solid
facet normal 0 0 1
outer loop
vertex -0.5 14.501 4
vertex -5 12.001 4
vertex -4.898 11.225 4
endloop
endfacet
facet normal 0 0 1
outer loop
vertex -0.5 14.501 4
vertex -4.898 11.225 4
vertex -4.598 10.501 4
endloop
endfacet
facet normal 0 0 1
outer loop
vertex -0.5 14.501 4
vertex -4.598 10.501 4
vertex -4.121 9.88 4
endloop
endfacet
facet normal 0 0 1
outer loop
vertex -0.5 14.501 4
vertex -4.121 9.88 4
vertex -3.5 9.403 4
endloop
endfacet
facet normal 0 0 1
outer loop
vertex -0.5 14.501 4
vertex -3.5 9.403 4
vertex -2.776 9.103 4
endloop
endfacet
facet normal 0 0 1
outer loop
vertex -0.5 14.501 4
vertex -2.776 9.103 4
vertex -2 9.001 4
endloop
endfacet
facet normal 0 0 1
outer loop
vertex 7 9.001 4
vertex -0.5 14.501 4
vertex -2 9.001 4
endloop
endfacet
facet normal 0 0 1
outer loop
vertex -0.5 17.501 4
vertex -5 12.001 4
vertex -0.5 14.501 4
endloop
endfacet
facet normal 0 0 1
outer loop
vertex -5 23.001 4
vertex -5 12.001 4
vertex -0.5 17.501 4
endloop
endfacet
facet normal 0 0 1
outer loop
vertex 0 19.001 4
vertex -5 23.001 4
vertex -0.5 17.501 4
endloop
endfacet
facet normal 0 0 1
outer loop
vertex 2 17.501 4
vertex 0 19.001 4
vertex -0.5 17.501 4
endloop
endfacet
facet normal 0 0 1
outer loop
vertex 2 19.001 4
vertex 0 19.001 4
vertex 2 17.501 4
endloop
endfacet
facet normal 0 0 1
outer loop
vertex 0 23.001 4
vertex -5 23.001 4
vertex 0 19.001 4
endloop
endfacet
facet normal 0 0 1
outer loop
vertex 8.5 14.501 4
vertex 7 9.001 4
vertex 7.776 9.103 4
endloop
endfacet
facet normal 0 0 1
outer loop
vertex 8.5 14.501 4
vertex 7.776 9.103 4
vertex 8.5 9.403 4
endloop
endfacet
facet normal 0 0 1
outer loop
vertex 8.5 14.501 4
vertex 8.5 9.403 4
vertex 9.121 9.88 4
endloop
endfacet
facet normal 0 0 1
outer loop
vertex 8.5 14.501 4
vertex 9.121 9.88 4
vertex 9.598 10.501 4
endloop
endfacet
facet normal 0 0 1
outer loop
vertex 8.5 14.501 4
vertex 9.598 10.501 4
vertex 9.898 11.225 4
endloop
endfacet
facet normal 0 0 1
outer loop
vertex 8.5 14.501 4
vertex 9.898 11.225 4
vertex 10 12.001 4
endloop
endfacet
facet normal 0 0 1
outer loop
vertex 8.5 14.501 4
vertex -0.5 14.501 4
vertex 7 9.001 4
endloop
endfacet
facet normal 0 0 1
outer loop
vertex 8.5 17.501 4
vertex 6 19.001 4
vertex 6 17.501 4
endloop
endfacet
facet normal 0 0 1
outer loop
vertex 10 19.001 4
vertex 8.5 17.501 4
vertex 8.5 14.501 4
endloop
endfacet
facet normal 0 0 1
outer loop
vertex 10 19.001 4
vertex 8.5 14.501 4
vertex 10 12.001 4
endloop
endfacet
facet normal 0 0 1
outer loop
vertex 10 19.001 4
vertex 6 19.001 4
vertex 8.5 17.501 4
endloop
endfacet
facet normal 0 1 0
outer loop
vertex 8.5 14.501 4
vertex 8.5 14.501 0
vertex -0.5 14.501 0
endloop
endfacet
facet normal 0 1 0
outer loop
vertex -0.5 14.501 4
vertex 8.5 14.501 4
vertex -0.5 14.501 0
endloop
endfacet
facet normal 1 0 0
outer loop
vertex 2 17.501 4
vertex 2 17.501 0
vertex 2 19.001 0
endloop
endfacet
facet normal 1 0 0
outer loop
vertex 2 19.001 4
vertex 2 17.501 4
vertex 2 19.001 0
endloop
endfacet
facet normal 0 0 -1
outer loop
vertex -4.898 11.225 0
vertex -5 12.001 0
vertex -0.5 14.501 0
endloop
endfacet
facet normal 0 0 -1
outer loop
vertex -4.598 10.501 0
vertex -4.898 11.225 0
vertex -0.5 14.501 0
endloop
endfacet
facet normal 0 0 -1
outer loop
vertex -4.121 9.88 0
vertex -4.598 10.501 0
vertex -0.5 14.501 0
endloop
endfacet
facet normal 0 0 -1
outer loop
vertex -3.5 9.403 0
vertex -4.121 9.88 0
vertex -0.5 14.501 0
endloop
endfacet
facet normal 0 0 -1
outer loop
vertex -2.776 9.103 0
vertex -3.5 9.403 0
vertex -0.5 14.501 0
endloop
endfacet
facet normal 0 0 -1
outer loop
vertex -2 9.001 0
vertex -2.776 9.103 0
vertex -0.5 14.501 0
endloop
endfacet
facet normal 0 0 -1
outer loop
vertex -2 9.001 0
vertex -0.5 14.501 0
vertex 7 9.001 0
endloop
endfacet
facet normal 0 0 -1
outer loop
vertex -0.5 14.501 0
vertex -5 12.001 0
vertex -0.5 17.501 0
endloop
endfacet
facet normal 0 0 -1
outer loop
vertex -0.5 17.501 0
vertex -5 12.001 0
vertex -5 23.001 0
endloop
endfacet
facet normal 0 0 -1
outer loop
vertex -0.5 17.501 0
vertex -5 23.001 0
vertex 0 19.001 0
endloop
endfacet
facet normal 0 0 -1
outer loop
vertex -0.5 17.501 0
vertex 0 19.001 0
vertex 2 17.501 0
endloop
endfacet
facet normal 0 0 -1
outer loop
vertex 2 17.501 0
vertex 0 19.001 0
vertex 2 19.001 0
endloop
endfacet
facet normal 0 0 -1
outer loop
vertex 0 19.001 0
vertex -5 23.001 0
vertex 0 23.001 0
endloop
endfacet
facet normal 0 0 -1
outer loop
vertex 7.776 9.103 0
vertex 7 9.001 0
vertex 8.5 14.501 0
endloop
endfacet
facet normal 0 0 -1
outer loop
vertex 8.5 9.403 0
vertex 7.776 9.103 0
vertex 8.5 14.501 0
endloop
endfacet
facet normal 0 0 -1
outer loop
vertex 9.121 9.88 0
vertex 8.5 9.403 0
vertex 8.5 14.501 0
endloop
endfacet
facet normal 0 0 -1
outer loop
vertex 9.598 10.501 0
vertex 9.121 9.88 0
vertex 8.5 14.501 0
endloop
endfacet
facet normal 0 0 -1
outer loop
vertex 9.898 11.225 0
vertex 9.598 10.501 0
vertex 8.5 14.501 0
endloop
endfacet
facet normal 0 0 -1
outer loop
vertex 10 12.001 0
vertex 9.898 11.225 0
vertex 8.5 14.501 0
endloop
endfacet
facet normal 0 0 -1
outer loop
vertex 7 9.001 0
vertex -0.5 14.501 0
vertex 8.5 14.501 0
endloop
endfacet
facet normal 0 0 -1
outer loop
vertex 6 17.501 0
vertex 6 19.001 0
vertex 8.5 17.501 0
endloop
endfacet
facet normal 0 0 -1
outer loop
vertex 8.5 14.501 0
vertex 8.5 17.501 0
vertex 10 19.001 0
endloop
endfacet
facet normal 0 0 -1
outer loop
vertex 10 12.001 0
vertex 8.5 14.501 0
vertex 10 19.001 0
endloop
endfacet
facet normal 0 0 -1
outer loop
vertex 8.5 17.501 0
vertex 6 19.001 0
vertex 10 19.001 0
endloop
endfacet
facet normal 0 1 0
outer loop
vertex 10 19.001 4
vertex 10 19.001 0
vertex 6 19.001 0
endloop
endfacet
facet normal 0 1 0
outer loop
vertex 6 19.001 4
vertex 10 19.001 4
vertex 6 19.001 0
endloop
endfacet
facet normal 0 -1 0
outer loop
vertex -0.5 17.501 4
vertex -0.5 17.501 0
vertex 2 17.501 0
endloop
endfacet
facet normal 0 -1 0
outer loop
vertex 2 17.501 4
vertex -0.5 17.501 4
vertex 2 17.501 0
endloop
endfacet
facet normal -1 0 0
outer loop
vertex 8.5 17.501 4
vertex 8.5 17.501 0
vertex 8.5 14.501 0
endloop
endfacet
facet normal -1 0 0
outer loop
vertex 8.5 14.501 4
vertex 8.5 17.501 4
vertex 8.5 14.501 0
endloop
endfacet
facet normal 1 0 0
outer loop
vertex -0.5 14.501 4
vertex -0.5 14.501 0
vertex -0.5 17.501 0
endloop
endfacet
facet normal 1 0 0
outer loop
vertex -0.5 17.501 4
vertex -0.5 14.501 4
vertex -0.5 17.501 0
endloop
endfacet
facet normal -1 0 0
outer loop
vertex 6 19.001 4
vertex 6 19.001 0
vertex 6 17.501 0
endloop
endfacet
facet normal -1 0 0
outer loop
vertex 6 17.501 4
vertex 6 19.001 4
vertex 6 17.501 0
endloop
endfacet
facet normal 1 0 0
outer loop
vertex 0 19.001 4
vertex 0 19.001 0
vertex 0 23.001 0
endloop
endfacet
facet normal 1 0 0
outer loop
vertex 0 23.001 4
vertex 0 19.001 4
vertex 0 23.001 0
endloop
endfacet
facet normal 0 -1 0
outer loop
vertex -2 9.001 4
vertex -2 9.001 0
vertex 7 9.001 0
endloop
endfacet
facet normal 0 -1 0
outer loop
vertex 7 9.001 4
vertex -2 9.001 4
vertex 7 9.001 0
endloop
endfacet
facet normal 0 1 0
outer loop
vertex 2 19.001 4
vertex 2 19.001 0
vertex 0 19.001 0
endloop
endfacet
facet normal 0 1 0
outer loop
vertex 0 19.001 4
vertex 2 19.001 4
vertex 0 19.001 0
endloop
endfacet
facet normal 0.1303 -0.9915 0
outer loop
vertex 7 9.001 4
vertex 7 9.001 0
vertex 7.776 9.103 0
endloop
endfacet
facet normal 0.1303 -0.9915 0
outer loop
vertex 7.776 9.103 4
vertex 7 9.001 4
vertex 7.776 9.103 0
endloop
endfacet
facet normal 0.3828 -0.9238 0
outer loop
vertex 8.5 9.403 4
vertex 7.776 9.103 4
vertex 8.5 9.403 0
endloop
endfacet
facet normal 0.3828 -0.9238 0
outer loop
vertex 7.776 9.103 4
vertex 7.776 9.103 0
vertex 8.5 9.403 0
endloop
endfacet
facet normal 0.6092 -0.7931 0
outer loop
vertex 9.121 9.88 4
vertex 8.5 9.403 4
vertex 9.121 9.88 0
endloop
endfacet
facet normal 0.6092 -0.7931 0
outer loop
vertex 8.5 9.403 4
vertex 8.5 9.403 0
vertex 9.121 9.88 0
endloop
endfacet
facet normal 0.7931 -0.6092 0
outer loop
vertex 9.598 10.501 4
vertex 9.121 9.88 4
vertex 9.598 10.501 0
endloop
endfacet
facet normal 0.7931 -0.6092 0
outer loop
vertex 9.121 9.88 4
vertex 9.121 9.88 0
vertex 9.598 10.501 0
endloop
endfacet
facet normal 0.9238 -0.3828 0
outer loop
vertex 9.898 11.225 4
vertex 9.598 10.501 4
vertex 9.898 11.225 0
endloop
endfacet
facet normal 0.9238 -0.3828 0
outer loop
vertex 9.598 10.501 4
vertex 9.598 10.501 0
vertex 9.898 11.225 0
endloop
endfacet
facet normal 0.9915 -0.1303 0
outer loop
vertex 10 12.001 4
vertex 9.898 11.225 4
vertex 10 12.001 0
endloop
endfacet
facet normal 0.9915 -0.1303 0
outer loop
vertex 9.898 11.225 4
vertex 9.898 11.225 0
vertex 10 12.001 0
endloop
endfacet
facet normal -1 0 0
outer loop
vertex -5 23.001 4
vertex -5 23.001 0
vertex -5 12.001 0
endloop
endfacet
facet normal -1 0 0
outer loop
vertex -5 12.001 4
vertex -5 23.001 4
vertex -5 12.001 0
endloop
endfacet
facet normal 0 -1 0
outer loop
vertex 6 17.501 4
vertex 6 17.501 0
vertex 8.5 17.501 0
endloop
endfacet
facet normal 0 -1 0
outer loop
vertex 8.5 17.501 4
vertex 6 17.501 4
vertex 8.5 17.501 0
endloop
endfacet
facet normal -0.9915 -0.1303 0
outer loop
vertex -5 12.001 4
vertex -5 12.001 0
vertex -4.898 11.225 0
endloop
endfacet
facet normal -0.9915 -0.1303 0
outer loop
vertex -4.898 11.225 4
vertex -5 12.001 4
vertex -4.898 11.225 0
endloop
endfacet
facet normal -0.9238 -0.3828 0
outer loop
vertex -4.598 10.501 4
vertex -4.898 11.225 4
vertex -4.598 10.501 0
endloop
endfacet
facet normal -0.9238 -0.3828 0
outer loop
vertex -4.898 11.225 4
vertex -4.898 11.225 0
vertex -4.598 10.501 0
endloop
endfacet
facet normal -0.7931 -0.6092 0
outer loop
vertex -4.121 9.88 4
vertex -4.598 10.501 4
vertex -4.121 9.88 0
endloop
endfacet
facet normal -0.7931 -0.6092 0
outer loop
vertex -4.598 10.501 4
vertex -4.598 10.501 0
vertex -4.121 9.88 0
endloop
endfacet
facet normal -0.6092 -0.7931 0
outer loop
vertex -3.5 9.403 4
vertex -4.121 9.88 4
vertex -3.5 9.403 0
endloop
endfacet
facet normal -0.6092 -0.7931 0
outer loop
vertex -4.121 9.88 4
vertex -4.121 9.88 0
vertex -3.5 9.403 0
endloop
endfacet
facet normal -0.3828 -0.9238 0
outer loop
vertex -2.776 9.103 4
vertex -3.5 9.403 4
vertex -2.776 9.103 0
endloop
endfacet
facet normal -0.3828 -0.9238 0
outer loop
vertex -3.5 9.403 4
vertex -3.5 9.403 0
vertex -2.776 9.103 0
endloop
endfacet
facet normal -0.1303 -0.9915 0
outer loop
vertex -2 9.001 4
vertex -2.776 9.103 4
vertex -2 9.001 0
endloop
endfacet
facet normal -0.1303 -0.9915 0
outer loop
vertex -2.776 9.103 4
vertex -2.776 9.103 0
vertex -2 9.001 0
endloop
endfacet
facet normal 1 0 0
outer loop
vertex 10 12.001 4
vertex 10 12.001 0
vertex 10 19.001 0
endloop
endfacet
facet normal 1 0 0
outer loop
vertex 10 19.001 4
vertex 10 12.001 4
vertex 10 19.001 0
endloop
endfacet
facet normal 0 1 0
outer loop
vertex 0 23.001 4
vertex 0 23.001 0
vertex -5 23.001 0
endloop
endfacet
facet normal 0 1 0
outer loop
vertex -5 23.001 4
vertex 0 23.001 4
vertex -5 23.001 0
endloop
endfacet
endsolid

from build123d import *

# Parameters (mm, degrees)
SALIENTE_EXTRUIR1_DEPTH = 4


with BuildPart() as part:
    # Croquis1 → Saliente-Extruir1 (new body)
    with BuildSketch(Plane.XY):
        with BuildLine():
            Line((0, 23.001027223), (-5, 23.001027223))
            Line((-5, 23.001027223), (-5, 12.001027223))
            ThreePointArc((-5, 12.001027223), (-4.121320344, 9.87970688), (-2, 9.001027223))
            Line((-2, 9.001027223), (7, 9.001027223))
            ThreePointArc((7, 9.001027223), (9.121320344, 9.87970688), (10, 12.001027223))
            Line((10, 12.001027223), (10, 19.001027223))
            Line((10, 19.001027223), (6, 19.001027223))
            Line((6, 19.001027223), (6, 17.501027223))
            Line((6, 17.501027223), (8.5, 17.501027223))
            Line((8.5, 17.501027223), (8.5, 14.501027223))
            Line((8.5, 14.501027223), (-0.5, 14.501027223))
            Line((-0.5, 14.501027223), (-0.5, 17.501027223))
            Line((-0.5, 17.501027223), (2, 17.501027223))
            Line((2, 17.501027223), (2, 19.001027223))
            Line((2, 19.001027223), (0, 19.001027223))
            Line((0, 19.001027223), (0, 23.001027223))
        make_face()
    extrude(amount=SALIENTE_EXTRUIR1_DEPTH)


solid = part.part
